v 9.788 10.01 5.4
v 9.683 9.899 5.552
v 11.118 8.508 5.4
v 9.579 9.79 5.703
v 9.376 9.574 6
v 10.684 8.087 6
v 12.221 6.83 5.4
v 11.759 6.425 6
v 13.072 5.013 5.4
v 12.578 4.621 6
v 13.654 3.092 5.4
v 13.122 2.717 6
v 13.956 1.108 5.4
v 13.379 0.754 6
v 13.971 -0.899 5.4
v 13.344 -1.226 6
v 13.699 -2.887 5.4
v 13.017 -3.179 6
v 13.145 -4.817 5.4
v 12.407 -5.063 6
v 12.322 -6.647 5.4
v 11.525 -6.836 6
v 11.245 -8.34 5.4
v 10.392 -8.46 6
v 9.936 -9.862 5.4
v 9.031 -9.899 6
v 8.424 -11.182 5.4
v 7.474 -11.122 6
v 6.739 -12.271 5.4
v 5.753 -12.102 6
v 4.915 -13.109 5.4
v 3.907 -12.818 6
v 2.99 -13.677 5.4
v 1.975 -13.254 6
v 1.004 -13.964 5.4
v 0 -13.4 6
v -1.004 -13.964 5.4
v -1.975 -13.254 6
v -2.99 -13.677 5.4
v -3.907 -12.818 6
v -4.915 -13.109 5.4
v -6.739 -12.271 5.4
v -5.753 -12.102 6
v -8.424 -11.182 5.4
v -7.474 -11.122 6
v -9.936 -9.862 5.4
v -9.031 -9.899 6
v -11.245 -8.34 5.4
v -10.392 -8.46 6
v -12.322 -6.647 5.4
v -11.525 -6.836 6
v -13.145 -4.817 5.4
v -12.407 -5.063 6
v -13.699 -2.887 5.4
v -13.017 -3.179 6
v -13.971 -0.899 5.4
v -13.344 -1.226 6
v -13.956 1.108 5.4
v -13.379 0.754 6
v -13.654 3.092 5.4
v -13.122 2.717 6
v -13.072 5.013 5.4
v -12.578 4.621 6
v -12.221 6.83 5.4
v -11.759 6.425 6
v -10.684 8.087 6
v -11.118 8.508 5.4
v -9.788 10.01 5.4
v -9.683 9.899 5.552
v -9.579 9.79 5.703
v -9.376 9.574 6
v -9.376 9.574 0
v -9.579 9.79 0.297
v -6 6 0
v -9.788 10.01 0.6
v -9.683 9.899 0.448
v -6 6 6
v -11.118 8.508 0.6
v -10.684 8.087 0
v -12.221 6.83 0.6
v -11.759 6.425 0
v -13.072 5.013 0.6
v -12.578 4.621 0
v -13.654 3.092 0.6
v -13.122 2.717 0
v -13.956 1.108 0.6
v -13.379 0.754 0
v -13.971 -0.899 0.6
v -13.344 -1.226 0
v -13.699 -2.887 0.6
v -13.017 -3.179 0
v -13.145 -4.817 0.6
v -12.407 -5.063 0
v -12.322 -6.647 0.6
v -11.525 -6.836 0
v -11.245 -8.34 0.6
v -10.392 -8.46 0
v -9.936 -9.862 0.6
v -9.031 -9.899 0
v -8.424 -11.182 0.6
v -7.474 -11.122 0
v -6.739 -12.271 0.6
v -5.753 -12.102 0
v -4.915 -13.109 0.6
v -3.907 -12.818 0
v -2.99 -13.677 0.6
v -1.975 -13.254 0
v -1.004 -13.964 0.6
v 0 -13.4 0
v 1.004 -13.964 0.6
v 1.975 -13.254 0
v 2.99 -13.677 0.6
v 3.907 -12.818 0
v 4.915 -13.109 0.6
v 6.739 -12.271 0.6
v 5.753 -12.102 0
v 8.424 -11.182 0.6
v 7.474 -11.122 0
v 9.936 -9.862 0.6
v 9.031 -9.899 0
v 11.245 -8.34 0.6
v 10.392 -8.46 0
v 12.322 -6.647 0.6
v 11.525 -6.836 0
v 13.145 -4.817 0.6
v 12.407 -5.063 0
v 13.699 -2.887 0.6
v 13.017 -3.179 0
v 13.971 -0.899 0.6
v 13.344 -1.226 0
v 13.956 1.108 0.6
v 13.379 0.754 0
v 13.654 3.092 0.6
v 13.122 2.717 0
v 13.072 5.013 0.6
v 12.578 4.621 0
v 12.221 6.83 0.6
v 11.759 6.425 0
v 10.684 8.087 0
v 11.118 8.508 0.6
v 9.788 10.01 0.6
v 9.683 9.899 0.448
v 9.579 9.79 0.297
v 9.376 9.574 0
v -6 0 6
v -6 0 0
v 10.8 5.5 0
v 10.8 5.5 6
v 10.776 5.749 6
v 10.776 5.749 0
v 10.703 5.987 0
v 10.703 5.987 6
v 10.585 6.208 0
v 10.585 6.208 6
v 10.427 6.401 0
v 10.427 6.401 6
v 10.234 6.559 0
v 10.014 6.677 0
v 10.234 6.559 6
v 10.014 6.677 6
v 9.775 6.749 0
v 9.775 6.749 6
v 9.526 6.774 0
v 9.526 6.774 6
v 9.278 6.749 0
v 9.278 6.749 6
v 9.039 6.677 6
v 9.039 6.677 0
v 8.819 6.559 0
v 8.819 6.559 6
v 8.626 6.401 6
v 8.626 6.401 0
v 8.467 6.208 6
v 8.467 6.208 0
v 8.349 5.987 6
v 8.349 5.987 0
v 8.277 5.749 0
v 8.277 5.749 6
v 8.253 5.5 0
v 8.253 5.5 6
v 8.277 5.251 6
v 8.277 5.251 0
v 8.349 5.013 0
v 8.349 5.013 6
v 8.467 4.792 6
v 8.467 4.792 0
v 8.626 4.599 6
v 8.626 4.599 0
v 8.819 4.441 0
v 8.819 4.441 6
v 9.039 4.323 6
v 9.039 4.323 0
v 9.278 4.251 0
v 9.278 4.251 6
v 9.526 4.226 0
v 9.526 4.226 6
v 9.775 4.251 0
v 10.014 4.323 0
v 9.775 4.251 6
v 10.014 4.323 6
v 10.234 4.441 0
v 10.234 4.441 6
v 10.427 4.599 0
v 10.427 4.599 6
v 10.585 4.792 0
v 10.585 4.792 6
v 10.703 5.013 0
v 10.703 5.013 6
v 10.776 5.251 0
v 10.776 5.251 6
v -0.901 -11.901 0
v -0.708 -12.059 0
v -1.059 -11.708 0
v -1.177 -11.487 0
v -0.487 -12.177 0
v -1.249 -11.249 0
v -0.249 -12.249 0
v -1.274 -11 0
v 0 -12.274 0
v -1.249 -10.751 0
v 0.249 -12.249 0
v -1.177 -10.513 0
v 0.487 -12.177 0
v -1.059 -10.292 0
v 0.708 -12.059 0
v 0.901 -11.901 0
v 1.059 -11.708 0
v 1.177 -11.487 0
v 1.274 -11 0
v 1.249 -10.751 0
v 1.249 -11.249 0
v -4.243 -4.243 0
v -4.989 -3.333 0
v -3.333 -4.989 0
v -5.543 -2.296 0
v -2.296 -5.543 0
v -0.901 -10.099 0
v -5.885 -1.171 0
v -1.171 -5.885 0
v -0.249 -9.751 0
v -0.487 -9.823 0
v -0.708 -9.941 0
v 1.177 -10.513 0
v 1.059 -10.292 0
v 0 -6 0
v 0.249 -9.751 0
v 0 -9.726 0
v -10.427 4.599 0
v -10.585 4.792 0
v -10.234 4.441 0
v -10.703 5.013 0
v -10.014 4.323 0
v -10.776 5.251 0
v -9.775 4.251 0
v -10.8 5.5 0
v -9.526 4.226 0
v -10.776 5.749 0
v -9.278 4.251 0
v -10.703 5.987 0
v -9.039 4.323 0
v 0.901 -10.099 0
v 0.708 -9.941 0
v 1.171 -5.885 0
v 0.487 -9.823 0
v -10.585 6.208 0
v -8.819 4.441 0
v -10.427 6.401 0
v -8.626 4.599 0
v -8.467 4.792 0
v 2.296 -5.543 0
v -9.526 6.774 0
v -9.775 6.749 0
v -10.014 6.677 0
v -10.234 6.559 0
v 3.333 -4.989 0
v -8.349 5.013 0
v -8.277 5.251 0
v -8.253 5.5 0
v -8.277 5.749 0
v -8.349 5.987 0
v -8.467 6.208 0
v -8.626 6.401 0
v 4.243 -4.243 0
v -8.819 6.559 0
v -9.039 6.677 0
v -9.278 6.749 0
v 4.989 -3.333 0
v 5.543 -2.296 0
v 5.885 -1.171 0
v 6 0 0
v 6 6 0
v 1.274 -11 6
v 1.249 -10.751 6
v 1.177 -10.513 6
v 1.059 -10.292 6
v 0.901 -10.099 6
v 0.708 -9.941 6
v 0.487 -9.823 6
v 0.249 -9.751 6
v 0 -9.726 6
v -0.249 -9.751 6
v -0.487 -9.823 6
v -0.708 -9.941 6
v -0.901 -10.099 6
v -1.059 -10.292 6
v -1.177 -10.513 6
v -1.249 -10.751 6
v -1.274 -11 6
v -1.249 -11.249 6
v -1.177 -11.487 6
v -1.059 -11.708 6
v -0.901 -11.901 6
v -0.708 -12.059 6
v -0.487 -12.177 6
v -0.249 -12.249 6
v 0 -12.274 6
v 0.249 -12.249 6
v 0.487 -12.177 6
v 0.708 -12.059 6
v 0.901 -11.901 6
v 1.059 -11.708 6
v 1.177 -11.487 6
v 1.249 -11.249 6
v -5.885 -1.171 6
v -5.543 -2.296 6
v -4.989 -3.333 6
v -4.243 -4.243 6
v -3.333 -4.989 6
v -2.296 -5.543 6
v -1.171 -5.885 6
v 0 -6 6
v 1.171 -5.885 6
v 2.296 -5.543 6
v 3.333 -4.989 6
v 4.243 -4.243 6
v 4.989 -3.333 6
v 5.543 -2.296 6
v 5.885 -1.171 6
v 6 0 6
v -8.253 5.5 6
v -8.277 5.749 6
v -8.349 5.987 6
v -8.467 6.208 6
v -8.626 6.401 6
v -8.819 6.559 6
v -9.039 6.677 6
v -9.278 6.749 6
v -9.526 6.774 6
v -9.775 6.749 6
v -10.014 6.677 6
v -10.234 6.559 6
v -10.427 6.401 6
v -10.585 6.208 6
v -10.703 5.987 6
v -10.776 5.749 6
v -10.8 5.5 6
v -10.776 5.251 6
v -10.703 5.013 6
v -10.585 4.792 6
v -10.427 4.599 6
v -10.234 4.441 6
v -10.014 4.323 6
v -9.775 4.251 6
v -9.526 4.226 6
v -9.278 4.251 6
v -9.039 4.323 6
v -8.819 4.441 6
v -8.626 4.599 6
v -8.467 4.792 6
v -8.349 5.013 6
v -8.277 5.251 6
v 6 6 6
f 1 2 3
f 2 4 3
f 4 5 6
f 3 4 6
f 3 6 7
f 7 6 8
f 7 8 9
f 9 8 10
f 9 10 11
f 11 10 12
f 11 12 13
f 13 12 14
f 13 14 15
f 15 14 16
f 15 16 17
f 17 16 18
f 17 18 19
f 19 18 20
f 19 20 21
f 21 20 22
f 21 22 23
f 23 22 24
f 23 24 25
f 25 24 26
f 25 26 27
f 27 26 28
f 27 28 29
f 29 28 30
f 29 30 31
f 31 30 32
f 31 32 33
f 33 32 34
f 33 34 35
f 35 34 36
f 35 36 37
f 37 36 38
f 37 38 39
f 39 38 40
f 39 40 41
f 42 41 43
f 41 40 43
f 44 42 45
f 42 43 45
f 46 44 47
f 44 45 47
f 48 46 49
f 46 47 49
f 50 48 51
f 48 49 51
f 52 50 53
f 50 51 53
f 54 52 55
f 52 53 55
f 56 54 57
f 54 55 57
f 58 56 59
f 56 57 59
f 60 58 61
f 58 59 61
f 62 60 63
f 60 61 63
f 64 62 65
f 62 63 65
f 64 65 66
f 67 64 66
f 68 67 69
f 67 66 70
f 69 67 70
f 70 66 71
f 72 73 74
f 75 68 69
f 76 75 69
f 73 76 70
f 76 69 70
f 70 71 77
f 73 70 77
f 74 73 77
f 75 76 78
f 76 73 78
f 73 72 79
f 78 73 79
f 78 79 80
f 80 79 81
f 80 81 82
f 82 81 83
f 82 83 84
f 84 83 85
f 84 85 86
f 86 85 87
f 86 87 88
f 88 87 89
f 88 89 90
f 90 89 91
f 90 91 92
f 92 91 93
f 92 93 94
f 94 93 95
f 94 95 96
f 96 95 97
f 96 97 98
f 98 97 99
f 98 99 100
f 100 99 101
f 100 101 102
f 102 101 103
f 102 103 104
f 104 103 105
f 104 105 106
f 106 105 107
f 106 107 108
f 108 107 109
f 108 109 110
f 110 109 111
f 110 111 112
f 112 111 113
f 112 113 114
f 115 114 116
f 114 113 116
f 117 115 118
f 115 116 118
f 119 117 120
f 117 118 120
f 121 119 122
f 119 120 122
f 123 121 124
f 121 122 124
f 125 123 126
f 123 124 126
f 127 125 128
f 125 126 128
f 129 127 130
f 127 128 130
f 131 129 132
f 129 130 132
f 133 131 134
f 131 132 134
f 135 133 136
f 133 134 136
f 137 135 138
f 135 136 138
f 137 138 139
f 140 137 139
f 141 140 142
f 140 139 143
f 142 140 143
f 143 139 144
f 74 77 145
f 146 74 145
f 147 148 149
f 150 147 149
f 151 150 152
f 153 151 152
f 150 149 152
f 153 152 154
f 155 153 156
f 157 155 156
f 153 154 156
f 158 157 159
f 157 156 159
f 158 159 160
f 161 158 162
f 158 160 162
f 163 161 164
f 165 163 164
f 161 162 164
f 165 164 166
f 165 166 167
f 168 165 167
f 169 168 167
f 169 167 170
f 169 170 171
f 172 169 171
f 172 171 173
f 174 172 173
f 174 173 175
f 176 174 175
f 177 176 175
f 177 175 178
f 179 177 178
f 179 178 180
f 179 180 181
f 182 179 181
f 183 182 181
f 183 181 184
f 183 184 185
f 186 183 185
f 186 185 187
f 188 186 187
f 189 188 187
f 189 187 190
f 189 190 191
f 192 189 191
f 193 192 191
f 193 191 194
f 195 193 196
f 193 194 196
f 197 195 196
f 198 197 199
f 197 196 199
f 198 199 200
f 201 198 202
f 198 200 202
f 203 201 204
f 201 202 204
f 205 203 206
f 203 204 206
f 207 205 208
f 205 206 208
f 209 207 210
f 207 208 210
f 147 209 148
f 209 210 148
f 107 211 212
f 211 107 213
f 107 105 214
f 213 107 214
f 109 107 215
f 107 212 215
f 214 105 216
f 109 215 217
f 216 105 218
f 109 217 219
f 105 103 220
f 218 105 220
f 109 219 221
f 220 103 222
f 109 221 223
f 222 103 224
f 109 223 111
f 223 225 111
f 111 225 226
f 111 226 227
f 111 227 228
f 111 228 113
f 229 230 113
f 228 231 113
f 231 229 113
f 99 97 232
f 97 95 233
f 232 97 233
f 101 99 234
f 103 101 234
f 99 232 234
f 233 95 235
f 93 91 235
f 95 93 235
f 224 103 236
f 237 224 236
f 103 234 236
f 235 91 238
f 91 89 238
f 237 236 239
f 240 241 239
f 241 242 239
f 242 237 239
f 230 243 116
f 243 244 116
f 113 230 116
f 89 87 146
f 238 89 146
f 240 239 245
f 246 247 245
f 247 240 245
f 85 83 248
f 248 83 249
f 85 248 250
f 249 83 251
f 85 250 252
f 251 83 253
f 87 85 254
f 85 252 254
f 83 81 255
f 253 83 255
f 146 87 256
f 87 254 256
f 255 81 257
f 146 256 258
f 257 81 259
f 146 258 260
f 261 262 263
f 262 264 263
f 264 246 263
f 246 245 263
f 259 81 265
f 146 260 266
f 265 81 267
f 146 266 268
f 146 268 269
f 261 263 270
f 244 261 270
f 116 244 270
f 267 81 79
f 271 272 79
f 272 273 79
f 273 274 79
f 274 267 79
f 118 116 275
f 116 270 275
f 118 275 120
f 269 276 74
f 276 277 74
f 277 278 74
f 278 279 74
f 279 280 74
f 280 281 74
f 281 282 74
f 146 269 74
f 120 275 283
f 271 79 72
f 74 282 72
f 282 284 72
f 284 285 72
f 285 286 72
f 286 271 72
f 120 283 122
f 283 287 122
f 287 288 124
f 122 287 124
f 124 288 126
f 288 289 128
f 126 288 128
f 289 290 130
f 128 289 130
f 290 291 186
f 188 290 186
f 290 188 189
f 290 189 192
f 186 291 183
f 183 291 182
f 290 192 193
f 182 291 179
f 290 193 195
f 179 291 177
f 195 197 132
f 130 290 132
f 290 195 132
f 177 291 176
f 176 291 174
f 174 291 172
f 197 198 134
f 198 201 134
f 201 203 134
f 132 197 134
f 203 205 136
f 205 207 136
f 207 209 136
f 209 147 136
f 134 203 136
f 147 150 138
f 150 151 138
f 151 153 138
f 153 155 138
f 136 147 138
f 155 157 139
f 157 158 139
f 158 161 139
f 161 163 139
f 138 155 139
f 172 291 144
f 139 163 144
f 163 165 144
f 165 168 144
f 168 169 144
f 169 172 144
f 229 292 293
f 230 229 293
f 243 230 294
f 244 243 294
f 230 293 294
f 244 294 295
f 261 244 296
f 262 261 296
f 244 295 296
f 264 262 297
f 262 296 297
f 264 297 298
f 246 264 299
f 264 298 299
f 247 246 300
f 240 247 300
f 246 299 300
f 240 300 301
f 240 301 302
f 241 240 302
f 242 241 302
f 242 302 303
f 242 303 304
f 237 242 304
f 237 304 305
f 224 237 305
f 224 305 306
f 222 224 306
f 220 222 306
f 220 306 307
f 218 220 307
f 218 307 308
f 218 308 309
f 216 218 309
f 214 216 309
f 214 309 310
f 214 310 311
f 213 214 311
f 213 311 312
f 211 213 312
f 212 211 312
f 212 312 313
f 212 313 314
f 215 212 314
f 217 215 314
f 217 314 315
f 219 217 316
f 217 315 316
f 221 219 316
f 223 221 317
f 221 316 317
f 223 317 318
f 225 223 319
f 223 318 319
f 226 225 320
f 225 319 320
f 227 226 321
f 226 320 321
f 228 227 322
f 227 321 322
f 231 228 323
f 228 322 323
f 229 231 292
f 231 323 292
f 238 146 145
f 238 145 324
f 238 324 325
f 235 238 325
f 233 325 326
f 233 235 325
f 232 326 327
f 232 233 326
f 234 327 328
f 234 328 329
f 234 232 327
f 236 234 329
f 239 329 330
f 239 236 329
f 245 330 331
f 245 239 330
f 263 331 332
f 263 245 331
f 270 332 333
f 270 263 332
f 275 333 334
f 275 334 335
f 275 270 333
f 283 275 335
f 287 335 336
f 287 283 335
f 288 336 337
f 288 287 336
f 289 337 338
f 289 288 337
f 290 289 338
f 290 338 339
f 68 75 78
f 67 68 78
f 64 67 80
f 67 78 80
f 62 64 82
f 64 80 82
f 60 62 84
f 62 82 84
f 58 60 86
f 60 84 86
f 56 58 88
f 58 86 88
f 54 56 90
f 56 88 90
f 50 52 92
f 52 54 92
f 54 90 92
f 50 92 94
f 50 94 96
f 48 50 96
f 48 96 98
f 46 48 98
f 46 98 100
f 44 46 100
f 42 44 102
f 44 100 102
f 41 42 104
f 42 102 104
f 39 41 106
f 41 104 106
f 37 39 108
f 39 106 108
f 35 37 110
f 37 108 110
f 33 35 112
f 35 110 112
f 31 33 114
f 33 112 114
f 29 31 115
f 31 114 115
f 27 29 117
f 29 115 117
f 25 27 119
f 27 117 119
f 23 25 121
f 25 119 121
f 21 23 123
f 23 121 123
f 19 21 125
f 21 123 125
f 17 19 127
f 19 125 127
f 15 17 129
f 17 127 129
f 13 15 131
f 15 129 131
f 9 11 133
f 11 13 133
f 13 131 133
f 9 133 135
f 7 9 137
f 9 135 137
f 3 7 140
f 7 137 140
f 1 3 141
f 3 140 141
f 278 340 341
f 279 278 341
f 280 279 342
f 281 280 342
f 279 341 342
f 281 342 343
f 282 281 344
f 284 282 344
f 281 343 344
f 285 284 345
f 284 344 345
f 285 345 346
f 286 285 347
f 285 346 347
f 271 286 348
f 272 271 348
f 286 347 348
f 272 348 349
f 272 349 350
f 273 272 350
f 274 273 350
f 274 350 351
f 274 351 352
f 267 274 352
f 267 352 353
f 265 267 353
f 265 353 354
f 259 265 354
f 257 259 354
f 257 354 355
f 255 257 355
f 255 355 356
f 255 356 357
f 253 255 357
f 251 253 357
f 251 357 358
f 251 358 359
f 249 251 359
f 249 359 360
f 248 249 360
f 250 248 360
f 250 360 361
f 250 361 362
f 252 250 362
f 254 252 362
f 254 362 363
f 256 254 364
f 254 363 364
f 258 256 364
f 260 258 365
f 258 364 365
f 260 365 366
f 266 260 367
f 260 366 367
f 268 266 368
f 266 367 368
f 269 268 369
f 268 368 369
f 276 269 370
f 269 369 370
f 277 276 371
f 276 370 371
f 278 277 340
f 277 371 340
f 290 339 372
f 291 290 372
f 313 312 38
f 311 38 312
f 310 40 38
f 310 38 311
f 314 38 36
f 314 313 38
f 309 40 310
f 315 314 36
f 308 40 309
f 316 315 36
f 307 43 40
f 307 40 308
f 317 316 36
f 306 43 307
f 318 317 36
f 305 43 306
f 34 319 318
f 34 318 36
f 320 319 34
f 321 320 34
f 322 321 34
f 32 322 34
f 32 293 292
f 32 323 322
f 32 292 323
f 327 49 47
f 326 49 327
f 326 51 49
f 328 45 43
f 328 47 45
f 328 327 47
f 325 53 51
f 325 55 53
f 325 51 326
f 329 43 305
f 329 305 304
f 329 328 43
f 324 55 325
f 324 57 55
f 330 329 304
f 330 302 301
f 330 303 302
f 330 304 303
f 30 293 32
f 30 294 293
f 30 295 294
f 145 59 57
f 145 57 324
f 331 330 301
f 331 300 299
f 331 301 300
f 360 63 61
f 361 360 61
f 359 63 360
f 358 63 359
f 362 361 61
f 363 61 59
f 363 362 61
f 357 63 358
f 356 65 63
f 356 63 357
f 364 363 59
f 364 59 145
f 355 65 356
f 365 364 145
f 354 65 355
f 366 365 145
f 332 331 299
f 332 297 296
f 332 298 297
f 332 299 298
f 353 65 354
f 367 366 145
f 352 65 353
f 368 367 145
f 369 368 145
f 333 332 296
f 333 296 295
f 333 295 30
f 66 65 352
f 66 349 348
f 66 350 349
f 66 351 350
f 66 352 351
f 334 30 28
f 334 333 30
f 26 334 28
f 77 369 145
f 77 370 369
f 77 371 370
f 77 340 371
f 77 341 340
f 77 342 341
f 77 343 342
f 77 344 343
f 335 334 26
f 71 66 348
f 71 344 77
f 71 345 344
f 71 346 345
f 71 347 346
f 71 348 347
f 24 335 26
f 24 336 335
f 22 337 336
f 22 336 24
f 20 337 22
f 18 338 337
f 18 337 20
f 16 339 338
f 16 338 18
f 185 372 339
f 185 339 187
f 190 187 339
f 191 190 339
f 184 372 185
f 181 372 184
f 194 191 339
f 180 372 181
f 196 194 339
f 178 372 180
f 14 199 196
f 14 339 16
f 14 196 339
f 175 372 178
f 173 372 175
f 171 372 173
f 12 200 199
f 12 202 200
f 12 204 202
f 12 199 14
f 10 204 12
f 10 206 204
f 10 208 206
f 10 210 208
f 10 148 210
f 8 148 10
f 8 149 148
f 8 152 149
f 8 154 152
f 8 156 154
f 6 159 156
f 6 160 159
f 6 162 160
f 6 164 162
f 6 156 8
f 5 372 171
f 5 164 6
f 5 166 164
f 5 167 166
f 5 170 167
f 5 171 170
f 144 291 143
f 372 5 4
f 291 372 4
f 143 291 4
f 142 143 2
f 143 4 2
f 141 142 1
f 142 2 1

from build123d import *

# Parameters (mm, degrees)
SKETCH_1_R          = 14
SKETCH_1_R_2        = 6
EXTRUDE_1_DEPTH     = 6
SKETCH_2_R          = 1.273771183
CUT_EXTRUDE_1_DEPTH = 21.688160866
CUT_EXTRUDE_2_DEPTH = 21.688160866
CHAMFER_1_SIZE      = 0.6


with BuildPart() as part:
    # 草圖1 → 填料-伸長1 (new body)
    with BuildSketch(Plane.XY):
        Circle(SKETCH_1_R)
        Circle(SKETCH_1_R_2, mode=Mode.SUBTRACT)
    extrude(amount=EXTRUDE_1_DEPTH)

    # 草圖2 → 除料-伸長1 (cut, through all)
    with BuildSketch(Plane.XY.offset(6)):
        with Locations((0, -11)):
            Circle(SKETCH_2_R)
        with Locations((-9.526279442, 5.5)):
            Circle(SKETCH_2_R)
        with Locations((9.526279442, 5.5)):
            Circle(SKETCH_2_R)
    extrude(amount=-CUT_EXTRUDE_1_DEPTH, mode=Mode.SUBTRACT)

    # 草圖3 → 除料-伸長2 (cut, through all)
    with BuildSketch(Plane.XY.offset(6)):
        with BuildLine():
            Line((6, 0), (6, 6))
            Line((6, 6), (9.787707238, 10.010034317))
            ThreePointArc((9.787707238, 10.010034317), (0, 14), (-9.787707238, 10.010034317))
            Line((-9.787707238, 10.010034317), (-6, 6))
            Line((-6, 6), (-6, 0))
            Line((-6, 0), (6, 0))
        make_face()
    extrude(amount=-CUT_EXTRUDE_2_DEPTH, mode=Mode.SUBTRACT)

    # 導角1
    chamfer_1_edges = [part.edges().sort_by_distance(p)[0] for p in [
        (0, -14, 6),
        (0, -14, 0),
    ]]
    chamfer(chamfer_1_edges, length=CHAMFER_1_SIZE)


solid = part.part
